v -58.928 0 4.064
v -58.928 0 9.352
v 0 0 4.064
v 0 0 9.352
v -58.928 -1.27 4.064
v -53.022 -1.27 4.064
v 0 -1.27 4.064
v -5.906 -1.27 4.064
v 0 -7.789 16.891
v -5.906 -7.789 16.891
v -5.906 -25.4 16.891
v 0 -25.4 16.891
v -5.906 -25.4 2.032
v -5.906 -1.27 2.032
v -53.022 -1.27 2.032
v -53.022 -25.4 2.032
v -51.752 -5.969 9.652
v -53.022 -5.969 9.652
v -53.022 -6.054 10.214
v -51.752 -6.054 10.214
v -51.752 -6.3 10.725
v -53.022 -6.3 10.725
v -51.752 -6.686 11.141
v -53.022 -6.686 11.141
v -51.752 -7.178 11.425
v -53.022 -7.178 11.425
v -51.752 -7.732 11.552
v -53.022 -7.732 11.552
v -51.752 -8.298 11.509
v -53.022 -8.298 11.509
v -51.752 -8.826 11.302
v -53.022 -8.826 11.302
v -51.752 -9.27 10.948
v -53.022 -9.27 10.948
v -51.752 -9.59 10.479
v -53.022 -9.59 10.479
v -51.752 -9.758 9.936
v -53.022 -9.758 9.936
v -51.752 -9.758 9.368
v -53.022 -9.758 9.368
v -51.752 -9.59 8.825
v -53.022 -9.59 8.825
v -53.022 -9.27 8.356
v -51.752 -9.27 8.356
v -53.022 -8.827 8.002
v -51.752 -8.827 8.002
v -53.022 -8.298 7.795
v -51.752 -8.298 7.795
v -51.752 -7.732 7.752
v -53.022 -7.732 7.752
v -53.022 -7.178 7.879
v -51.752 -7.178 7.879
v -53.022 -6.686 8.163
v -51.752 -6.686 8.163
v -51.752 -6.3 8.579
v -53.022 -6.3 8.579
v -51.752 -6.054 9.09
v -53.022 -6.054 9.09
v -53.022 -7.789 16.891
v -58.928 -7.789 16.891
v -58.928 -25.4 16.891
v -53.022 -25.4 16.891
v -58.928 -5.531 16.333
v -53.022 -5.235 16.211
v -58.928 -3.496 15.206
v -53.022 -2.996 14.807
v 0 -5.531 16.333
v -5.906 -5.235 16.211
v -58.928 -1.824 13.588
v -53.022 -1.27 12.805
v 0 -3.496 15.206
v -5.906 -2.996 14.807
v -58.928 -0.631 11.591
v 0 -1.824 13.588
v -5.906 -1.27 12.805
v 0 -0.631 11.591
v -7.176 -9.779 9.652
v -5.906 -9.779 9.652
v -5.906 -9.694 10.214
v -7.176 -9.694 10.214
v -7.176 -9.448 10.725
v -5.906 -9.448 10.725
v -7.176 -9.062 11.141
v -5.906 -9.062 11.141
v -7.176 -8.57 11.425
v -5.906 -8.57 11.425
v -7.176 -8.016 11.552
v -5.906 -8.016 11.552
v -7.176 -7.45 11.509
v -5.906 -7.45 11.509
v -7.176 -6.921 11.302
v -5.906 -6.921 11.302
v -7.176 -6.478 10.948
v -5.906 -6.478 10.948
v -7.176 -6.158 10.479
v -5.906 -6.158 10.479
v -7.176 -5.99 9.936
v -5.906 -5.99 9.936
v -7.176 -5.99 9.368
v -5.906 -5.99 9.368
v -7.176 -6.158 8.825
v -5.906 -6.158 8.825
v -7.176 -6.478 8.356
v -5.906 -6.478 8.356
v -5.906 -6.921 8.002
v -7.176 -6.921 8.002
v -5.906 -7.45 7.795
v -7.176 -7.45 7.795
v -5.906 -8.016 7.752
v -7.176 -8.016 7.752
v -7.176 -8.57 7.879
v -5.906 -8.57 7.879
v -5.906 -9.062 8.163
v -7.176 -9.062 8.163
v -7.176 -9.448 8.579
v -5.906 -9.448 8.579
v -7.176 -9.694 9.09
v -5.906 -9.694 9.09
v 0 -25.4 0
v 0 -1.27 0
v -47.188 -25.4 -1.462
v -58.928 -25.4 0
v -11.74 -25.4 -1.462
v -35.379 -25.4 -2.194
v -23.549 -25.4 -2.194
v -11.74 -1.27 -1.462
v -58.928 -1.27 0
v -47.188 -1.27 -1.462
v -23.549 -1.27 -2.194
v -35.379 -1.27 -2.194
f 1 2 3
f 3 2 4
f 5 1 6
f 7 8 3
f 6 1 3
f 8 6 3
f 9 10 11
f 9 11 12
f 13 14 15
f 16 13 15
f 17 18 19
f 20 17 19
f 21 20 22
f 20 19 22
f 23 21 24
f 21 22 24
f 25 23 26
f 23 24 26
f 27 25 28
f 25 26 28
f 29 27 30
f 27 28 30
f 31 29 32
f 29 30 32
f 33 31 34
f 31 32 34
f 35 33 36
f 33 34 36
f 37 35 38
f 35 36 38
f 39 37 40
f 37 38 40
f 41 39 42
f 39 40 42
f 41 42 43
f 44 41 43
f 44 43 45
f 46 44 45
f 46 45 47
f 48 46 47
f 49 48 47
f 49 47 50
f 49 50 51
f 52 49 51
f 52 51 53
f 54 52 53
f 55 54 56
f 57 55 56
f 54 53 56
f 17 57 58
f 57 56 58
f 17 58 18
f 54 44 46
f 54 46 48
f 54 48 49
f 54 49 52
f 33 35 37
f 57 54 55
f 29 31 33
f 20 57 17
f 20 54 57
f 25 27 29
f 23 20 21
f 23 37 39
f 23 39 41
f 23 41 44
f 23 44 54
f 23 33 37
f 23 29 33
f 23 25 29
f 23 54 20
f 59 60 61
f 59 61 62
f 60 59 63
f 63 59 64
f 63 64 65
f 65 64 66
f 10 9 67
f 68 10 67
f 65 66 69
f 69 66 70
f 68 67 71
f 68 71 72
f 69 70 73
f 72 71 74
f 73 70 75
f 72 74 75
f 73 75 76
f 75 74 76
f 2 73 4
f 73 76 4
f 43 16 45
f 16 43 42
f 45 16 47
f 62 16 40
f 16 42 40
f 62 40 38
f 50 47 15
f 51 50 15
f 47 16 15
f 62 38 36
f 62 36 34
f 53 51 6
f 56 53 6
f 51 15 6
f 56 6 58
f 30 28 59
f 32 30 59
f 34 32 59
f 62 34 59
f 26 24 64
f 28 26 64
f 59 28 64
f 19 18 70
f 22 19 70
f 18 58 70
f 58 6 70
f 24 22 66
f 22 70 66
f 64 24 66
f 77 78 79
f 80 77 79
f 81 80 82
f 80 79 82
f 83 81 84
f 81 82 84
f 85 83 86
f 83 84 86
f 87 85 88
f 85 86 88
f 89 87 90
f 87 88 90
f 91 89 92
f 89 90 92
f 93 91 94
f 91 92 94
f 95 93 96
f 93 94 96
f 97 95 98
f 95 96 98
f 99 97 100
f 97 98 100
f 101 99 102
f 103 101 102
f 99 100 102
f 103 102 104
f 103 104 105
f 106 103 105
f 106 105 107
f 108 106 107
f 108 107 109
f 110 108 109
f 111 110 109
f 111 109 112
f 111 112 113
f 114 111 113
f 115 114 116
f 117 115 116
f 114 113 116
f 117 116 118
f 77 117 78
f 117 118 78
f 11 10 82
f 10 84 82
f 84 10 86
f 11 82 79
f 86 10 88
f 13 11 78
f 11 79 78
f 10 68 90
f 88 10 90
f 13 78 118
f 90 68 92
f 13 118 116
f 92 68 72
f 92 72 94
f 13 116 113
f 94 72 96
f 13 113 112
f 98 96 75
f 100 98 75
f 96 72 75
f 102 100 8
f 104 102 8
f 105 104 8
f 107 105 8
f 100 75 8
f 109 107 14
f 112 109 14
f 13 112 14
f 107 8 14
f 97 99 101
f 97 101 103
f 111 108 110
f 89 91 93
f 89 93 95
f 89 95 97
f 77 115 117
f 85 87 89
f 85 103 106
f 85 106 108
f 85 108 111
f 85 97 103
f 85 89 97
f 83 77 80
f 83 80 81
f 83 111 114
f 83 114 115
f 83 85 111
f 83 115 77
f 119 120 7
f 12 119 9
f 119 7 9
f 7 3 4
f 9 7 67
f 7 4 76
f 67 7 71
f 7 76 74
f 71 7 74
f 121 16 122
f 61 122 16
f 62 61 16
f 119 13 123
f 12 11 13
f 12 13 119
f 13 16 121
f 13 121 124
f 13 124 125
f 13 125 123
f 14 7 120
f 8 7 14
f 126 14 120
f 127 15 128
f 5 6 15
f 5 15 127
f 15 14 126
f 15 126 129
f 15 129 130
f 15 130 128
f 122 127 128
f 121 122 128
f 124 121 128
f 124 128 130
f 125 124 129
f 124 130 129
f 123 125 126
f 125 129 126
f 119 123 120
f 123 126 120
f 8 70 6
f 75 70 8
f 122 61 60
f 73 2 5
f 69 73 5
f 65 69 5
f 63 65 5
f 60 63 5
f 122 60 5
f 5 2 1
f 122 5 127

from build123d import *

# Parameters (mm, degrees)
F1_DEPTH  = 25.4
F0_W      = 47.117
F0_H      = 14.859
F2_DEPTH  = 1.27
F4_DEPTH  = 1.27
F5_R      = 1.905
F6_DEPTH  = 1.27
F7_R      = 1.905
F8_DEPTH  = 1.27
F10_DEPTH = 63.5


with BuildPart() as f1:
    # F0 (on Front) → F1 (new body)
    with BuildSketch(Plane.XZ):
        with BuildLine():
            ThreePointArc((-58.928, 0), (-29.464, -2.286), (0, 0))
            Line((0, 0), (0, 16.891))
            Line((0, 16.891), (-5.9055, 16.891))
            Line((-5.9055, 16.891), (-5.9055, 2.032))
            Line((-5.9055, 2.032), (-53.0225, 2.032))
            Line((-53.0225, 2.032), (-53.0225, 16.891))
            Line((-53.0225, 16.891), (-58.928, 16.891))
            Line((-58.928, 16.891), (-58.928, 0))
        make_face()
    extrude(amount=F1_DEPTH)

    # F0 (on Front) → F2 (join)
    with BuildSketch(Plane.XZ):
        with Locations((-29.464, 9.4615)):
            Rectangle(F0_W, F0_H)
    extrude(amount=F2_DEPTH)

    # F3 (on face) → F4 (cut)
    with BuildSketch(Plane(origin=(0, 0, 0), x_dir=(-1, 0, 0), z_dir=(0, 1, 0))):
        with BuildLine():
            Line((58.928, 4.064), (0, 4.064))
            Line((0, 4.064), (0, 0))
            ThreePointArc((0, 0), (29.464, -2.286), (58.928, 0))
            Line((58.928, 0), (58.928, 4.064))
        make_face()
    extrude(amount=-F4_DEPTH, mode=Mode.SUBTRACT)

    # F5 (on face) → F6 (join)
    with BuildSketch(Plane(origin=(-5.9055, 0, 0), x_dir=(0, -1, 0), z_dir=(-1, 0, 0))):
        with Locations((7.874, 9.652)):
            Circle(F5_R)
    extrude(amount=F6_DEPTH)

    # F7 (on face) → F8 (join)
    with BuildSketch(Plane.YZ.offset(-53.0225)):
        with Locations((-7.874, 9.652)):
            Circle(F7_R)
    extrude(amount=F8_DEPTH)

    # F9 (on face) → F10 (cut)
    with BuildSketch(Plane.YZ):
        with BuildLine():
            ThreePointArc((-7.7890837565, 16.891), (-2.606552262, 14.45208016), (0, 9.3518009536))
            Line((0, 9.3518009536), (0, 16.891))
            Line((0, 16.891), (-7.7890837565, 16.891))
        make_face()
    extrude(amount=-F10_DEPTH, mode=Mode.SUBTRACT)


solid = f1.part
